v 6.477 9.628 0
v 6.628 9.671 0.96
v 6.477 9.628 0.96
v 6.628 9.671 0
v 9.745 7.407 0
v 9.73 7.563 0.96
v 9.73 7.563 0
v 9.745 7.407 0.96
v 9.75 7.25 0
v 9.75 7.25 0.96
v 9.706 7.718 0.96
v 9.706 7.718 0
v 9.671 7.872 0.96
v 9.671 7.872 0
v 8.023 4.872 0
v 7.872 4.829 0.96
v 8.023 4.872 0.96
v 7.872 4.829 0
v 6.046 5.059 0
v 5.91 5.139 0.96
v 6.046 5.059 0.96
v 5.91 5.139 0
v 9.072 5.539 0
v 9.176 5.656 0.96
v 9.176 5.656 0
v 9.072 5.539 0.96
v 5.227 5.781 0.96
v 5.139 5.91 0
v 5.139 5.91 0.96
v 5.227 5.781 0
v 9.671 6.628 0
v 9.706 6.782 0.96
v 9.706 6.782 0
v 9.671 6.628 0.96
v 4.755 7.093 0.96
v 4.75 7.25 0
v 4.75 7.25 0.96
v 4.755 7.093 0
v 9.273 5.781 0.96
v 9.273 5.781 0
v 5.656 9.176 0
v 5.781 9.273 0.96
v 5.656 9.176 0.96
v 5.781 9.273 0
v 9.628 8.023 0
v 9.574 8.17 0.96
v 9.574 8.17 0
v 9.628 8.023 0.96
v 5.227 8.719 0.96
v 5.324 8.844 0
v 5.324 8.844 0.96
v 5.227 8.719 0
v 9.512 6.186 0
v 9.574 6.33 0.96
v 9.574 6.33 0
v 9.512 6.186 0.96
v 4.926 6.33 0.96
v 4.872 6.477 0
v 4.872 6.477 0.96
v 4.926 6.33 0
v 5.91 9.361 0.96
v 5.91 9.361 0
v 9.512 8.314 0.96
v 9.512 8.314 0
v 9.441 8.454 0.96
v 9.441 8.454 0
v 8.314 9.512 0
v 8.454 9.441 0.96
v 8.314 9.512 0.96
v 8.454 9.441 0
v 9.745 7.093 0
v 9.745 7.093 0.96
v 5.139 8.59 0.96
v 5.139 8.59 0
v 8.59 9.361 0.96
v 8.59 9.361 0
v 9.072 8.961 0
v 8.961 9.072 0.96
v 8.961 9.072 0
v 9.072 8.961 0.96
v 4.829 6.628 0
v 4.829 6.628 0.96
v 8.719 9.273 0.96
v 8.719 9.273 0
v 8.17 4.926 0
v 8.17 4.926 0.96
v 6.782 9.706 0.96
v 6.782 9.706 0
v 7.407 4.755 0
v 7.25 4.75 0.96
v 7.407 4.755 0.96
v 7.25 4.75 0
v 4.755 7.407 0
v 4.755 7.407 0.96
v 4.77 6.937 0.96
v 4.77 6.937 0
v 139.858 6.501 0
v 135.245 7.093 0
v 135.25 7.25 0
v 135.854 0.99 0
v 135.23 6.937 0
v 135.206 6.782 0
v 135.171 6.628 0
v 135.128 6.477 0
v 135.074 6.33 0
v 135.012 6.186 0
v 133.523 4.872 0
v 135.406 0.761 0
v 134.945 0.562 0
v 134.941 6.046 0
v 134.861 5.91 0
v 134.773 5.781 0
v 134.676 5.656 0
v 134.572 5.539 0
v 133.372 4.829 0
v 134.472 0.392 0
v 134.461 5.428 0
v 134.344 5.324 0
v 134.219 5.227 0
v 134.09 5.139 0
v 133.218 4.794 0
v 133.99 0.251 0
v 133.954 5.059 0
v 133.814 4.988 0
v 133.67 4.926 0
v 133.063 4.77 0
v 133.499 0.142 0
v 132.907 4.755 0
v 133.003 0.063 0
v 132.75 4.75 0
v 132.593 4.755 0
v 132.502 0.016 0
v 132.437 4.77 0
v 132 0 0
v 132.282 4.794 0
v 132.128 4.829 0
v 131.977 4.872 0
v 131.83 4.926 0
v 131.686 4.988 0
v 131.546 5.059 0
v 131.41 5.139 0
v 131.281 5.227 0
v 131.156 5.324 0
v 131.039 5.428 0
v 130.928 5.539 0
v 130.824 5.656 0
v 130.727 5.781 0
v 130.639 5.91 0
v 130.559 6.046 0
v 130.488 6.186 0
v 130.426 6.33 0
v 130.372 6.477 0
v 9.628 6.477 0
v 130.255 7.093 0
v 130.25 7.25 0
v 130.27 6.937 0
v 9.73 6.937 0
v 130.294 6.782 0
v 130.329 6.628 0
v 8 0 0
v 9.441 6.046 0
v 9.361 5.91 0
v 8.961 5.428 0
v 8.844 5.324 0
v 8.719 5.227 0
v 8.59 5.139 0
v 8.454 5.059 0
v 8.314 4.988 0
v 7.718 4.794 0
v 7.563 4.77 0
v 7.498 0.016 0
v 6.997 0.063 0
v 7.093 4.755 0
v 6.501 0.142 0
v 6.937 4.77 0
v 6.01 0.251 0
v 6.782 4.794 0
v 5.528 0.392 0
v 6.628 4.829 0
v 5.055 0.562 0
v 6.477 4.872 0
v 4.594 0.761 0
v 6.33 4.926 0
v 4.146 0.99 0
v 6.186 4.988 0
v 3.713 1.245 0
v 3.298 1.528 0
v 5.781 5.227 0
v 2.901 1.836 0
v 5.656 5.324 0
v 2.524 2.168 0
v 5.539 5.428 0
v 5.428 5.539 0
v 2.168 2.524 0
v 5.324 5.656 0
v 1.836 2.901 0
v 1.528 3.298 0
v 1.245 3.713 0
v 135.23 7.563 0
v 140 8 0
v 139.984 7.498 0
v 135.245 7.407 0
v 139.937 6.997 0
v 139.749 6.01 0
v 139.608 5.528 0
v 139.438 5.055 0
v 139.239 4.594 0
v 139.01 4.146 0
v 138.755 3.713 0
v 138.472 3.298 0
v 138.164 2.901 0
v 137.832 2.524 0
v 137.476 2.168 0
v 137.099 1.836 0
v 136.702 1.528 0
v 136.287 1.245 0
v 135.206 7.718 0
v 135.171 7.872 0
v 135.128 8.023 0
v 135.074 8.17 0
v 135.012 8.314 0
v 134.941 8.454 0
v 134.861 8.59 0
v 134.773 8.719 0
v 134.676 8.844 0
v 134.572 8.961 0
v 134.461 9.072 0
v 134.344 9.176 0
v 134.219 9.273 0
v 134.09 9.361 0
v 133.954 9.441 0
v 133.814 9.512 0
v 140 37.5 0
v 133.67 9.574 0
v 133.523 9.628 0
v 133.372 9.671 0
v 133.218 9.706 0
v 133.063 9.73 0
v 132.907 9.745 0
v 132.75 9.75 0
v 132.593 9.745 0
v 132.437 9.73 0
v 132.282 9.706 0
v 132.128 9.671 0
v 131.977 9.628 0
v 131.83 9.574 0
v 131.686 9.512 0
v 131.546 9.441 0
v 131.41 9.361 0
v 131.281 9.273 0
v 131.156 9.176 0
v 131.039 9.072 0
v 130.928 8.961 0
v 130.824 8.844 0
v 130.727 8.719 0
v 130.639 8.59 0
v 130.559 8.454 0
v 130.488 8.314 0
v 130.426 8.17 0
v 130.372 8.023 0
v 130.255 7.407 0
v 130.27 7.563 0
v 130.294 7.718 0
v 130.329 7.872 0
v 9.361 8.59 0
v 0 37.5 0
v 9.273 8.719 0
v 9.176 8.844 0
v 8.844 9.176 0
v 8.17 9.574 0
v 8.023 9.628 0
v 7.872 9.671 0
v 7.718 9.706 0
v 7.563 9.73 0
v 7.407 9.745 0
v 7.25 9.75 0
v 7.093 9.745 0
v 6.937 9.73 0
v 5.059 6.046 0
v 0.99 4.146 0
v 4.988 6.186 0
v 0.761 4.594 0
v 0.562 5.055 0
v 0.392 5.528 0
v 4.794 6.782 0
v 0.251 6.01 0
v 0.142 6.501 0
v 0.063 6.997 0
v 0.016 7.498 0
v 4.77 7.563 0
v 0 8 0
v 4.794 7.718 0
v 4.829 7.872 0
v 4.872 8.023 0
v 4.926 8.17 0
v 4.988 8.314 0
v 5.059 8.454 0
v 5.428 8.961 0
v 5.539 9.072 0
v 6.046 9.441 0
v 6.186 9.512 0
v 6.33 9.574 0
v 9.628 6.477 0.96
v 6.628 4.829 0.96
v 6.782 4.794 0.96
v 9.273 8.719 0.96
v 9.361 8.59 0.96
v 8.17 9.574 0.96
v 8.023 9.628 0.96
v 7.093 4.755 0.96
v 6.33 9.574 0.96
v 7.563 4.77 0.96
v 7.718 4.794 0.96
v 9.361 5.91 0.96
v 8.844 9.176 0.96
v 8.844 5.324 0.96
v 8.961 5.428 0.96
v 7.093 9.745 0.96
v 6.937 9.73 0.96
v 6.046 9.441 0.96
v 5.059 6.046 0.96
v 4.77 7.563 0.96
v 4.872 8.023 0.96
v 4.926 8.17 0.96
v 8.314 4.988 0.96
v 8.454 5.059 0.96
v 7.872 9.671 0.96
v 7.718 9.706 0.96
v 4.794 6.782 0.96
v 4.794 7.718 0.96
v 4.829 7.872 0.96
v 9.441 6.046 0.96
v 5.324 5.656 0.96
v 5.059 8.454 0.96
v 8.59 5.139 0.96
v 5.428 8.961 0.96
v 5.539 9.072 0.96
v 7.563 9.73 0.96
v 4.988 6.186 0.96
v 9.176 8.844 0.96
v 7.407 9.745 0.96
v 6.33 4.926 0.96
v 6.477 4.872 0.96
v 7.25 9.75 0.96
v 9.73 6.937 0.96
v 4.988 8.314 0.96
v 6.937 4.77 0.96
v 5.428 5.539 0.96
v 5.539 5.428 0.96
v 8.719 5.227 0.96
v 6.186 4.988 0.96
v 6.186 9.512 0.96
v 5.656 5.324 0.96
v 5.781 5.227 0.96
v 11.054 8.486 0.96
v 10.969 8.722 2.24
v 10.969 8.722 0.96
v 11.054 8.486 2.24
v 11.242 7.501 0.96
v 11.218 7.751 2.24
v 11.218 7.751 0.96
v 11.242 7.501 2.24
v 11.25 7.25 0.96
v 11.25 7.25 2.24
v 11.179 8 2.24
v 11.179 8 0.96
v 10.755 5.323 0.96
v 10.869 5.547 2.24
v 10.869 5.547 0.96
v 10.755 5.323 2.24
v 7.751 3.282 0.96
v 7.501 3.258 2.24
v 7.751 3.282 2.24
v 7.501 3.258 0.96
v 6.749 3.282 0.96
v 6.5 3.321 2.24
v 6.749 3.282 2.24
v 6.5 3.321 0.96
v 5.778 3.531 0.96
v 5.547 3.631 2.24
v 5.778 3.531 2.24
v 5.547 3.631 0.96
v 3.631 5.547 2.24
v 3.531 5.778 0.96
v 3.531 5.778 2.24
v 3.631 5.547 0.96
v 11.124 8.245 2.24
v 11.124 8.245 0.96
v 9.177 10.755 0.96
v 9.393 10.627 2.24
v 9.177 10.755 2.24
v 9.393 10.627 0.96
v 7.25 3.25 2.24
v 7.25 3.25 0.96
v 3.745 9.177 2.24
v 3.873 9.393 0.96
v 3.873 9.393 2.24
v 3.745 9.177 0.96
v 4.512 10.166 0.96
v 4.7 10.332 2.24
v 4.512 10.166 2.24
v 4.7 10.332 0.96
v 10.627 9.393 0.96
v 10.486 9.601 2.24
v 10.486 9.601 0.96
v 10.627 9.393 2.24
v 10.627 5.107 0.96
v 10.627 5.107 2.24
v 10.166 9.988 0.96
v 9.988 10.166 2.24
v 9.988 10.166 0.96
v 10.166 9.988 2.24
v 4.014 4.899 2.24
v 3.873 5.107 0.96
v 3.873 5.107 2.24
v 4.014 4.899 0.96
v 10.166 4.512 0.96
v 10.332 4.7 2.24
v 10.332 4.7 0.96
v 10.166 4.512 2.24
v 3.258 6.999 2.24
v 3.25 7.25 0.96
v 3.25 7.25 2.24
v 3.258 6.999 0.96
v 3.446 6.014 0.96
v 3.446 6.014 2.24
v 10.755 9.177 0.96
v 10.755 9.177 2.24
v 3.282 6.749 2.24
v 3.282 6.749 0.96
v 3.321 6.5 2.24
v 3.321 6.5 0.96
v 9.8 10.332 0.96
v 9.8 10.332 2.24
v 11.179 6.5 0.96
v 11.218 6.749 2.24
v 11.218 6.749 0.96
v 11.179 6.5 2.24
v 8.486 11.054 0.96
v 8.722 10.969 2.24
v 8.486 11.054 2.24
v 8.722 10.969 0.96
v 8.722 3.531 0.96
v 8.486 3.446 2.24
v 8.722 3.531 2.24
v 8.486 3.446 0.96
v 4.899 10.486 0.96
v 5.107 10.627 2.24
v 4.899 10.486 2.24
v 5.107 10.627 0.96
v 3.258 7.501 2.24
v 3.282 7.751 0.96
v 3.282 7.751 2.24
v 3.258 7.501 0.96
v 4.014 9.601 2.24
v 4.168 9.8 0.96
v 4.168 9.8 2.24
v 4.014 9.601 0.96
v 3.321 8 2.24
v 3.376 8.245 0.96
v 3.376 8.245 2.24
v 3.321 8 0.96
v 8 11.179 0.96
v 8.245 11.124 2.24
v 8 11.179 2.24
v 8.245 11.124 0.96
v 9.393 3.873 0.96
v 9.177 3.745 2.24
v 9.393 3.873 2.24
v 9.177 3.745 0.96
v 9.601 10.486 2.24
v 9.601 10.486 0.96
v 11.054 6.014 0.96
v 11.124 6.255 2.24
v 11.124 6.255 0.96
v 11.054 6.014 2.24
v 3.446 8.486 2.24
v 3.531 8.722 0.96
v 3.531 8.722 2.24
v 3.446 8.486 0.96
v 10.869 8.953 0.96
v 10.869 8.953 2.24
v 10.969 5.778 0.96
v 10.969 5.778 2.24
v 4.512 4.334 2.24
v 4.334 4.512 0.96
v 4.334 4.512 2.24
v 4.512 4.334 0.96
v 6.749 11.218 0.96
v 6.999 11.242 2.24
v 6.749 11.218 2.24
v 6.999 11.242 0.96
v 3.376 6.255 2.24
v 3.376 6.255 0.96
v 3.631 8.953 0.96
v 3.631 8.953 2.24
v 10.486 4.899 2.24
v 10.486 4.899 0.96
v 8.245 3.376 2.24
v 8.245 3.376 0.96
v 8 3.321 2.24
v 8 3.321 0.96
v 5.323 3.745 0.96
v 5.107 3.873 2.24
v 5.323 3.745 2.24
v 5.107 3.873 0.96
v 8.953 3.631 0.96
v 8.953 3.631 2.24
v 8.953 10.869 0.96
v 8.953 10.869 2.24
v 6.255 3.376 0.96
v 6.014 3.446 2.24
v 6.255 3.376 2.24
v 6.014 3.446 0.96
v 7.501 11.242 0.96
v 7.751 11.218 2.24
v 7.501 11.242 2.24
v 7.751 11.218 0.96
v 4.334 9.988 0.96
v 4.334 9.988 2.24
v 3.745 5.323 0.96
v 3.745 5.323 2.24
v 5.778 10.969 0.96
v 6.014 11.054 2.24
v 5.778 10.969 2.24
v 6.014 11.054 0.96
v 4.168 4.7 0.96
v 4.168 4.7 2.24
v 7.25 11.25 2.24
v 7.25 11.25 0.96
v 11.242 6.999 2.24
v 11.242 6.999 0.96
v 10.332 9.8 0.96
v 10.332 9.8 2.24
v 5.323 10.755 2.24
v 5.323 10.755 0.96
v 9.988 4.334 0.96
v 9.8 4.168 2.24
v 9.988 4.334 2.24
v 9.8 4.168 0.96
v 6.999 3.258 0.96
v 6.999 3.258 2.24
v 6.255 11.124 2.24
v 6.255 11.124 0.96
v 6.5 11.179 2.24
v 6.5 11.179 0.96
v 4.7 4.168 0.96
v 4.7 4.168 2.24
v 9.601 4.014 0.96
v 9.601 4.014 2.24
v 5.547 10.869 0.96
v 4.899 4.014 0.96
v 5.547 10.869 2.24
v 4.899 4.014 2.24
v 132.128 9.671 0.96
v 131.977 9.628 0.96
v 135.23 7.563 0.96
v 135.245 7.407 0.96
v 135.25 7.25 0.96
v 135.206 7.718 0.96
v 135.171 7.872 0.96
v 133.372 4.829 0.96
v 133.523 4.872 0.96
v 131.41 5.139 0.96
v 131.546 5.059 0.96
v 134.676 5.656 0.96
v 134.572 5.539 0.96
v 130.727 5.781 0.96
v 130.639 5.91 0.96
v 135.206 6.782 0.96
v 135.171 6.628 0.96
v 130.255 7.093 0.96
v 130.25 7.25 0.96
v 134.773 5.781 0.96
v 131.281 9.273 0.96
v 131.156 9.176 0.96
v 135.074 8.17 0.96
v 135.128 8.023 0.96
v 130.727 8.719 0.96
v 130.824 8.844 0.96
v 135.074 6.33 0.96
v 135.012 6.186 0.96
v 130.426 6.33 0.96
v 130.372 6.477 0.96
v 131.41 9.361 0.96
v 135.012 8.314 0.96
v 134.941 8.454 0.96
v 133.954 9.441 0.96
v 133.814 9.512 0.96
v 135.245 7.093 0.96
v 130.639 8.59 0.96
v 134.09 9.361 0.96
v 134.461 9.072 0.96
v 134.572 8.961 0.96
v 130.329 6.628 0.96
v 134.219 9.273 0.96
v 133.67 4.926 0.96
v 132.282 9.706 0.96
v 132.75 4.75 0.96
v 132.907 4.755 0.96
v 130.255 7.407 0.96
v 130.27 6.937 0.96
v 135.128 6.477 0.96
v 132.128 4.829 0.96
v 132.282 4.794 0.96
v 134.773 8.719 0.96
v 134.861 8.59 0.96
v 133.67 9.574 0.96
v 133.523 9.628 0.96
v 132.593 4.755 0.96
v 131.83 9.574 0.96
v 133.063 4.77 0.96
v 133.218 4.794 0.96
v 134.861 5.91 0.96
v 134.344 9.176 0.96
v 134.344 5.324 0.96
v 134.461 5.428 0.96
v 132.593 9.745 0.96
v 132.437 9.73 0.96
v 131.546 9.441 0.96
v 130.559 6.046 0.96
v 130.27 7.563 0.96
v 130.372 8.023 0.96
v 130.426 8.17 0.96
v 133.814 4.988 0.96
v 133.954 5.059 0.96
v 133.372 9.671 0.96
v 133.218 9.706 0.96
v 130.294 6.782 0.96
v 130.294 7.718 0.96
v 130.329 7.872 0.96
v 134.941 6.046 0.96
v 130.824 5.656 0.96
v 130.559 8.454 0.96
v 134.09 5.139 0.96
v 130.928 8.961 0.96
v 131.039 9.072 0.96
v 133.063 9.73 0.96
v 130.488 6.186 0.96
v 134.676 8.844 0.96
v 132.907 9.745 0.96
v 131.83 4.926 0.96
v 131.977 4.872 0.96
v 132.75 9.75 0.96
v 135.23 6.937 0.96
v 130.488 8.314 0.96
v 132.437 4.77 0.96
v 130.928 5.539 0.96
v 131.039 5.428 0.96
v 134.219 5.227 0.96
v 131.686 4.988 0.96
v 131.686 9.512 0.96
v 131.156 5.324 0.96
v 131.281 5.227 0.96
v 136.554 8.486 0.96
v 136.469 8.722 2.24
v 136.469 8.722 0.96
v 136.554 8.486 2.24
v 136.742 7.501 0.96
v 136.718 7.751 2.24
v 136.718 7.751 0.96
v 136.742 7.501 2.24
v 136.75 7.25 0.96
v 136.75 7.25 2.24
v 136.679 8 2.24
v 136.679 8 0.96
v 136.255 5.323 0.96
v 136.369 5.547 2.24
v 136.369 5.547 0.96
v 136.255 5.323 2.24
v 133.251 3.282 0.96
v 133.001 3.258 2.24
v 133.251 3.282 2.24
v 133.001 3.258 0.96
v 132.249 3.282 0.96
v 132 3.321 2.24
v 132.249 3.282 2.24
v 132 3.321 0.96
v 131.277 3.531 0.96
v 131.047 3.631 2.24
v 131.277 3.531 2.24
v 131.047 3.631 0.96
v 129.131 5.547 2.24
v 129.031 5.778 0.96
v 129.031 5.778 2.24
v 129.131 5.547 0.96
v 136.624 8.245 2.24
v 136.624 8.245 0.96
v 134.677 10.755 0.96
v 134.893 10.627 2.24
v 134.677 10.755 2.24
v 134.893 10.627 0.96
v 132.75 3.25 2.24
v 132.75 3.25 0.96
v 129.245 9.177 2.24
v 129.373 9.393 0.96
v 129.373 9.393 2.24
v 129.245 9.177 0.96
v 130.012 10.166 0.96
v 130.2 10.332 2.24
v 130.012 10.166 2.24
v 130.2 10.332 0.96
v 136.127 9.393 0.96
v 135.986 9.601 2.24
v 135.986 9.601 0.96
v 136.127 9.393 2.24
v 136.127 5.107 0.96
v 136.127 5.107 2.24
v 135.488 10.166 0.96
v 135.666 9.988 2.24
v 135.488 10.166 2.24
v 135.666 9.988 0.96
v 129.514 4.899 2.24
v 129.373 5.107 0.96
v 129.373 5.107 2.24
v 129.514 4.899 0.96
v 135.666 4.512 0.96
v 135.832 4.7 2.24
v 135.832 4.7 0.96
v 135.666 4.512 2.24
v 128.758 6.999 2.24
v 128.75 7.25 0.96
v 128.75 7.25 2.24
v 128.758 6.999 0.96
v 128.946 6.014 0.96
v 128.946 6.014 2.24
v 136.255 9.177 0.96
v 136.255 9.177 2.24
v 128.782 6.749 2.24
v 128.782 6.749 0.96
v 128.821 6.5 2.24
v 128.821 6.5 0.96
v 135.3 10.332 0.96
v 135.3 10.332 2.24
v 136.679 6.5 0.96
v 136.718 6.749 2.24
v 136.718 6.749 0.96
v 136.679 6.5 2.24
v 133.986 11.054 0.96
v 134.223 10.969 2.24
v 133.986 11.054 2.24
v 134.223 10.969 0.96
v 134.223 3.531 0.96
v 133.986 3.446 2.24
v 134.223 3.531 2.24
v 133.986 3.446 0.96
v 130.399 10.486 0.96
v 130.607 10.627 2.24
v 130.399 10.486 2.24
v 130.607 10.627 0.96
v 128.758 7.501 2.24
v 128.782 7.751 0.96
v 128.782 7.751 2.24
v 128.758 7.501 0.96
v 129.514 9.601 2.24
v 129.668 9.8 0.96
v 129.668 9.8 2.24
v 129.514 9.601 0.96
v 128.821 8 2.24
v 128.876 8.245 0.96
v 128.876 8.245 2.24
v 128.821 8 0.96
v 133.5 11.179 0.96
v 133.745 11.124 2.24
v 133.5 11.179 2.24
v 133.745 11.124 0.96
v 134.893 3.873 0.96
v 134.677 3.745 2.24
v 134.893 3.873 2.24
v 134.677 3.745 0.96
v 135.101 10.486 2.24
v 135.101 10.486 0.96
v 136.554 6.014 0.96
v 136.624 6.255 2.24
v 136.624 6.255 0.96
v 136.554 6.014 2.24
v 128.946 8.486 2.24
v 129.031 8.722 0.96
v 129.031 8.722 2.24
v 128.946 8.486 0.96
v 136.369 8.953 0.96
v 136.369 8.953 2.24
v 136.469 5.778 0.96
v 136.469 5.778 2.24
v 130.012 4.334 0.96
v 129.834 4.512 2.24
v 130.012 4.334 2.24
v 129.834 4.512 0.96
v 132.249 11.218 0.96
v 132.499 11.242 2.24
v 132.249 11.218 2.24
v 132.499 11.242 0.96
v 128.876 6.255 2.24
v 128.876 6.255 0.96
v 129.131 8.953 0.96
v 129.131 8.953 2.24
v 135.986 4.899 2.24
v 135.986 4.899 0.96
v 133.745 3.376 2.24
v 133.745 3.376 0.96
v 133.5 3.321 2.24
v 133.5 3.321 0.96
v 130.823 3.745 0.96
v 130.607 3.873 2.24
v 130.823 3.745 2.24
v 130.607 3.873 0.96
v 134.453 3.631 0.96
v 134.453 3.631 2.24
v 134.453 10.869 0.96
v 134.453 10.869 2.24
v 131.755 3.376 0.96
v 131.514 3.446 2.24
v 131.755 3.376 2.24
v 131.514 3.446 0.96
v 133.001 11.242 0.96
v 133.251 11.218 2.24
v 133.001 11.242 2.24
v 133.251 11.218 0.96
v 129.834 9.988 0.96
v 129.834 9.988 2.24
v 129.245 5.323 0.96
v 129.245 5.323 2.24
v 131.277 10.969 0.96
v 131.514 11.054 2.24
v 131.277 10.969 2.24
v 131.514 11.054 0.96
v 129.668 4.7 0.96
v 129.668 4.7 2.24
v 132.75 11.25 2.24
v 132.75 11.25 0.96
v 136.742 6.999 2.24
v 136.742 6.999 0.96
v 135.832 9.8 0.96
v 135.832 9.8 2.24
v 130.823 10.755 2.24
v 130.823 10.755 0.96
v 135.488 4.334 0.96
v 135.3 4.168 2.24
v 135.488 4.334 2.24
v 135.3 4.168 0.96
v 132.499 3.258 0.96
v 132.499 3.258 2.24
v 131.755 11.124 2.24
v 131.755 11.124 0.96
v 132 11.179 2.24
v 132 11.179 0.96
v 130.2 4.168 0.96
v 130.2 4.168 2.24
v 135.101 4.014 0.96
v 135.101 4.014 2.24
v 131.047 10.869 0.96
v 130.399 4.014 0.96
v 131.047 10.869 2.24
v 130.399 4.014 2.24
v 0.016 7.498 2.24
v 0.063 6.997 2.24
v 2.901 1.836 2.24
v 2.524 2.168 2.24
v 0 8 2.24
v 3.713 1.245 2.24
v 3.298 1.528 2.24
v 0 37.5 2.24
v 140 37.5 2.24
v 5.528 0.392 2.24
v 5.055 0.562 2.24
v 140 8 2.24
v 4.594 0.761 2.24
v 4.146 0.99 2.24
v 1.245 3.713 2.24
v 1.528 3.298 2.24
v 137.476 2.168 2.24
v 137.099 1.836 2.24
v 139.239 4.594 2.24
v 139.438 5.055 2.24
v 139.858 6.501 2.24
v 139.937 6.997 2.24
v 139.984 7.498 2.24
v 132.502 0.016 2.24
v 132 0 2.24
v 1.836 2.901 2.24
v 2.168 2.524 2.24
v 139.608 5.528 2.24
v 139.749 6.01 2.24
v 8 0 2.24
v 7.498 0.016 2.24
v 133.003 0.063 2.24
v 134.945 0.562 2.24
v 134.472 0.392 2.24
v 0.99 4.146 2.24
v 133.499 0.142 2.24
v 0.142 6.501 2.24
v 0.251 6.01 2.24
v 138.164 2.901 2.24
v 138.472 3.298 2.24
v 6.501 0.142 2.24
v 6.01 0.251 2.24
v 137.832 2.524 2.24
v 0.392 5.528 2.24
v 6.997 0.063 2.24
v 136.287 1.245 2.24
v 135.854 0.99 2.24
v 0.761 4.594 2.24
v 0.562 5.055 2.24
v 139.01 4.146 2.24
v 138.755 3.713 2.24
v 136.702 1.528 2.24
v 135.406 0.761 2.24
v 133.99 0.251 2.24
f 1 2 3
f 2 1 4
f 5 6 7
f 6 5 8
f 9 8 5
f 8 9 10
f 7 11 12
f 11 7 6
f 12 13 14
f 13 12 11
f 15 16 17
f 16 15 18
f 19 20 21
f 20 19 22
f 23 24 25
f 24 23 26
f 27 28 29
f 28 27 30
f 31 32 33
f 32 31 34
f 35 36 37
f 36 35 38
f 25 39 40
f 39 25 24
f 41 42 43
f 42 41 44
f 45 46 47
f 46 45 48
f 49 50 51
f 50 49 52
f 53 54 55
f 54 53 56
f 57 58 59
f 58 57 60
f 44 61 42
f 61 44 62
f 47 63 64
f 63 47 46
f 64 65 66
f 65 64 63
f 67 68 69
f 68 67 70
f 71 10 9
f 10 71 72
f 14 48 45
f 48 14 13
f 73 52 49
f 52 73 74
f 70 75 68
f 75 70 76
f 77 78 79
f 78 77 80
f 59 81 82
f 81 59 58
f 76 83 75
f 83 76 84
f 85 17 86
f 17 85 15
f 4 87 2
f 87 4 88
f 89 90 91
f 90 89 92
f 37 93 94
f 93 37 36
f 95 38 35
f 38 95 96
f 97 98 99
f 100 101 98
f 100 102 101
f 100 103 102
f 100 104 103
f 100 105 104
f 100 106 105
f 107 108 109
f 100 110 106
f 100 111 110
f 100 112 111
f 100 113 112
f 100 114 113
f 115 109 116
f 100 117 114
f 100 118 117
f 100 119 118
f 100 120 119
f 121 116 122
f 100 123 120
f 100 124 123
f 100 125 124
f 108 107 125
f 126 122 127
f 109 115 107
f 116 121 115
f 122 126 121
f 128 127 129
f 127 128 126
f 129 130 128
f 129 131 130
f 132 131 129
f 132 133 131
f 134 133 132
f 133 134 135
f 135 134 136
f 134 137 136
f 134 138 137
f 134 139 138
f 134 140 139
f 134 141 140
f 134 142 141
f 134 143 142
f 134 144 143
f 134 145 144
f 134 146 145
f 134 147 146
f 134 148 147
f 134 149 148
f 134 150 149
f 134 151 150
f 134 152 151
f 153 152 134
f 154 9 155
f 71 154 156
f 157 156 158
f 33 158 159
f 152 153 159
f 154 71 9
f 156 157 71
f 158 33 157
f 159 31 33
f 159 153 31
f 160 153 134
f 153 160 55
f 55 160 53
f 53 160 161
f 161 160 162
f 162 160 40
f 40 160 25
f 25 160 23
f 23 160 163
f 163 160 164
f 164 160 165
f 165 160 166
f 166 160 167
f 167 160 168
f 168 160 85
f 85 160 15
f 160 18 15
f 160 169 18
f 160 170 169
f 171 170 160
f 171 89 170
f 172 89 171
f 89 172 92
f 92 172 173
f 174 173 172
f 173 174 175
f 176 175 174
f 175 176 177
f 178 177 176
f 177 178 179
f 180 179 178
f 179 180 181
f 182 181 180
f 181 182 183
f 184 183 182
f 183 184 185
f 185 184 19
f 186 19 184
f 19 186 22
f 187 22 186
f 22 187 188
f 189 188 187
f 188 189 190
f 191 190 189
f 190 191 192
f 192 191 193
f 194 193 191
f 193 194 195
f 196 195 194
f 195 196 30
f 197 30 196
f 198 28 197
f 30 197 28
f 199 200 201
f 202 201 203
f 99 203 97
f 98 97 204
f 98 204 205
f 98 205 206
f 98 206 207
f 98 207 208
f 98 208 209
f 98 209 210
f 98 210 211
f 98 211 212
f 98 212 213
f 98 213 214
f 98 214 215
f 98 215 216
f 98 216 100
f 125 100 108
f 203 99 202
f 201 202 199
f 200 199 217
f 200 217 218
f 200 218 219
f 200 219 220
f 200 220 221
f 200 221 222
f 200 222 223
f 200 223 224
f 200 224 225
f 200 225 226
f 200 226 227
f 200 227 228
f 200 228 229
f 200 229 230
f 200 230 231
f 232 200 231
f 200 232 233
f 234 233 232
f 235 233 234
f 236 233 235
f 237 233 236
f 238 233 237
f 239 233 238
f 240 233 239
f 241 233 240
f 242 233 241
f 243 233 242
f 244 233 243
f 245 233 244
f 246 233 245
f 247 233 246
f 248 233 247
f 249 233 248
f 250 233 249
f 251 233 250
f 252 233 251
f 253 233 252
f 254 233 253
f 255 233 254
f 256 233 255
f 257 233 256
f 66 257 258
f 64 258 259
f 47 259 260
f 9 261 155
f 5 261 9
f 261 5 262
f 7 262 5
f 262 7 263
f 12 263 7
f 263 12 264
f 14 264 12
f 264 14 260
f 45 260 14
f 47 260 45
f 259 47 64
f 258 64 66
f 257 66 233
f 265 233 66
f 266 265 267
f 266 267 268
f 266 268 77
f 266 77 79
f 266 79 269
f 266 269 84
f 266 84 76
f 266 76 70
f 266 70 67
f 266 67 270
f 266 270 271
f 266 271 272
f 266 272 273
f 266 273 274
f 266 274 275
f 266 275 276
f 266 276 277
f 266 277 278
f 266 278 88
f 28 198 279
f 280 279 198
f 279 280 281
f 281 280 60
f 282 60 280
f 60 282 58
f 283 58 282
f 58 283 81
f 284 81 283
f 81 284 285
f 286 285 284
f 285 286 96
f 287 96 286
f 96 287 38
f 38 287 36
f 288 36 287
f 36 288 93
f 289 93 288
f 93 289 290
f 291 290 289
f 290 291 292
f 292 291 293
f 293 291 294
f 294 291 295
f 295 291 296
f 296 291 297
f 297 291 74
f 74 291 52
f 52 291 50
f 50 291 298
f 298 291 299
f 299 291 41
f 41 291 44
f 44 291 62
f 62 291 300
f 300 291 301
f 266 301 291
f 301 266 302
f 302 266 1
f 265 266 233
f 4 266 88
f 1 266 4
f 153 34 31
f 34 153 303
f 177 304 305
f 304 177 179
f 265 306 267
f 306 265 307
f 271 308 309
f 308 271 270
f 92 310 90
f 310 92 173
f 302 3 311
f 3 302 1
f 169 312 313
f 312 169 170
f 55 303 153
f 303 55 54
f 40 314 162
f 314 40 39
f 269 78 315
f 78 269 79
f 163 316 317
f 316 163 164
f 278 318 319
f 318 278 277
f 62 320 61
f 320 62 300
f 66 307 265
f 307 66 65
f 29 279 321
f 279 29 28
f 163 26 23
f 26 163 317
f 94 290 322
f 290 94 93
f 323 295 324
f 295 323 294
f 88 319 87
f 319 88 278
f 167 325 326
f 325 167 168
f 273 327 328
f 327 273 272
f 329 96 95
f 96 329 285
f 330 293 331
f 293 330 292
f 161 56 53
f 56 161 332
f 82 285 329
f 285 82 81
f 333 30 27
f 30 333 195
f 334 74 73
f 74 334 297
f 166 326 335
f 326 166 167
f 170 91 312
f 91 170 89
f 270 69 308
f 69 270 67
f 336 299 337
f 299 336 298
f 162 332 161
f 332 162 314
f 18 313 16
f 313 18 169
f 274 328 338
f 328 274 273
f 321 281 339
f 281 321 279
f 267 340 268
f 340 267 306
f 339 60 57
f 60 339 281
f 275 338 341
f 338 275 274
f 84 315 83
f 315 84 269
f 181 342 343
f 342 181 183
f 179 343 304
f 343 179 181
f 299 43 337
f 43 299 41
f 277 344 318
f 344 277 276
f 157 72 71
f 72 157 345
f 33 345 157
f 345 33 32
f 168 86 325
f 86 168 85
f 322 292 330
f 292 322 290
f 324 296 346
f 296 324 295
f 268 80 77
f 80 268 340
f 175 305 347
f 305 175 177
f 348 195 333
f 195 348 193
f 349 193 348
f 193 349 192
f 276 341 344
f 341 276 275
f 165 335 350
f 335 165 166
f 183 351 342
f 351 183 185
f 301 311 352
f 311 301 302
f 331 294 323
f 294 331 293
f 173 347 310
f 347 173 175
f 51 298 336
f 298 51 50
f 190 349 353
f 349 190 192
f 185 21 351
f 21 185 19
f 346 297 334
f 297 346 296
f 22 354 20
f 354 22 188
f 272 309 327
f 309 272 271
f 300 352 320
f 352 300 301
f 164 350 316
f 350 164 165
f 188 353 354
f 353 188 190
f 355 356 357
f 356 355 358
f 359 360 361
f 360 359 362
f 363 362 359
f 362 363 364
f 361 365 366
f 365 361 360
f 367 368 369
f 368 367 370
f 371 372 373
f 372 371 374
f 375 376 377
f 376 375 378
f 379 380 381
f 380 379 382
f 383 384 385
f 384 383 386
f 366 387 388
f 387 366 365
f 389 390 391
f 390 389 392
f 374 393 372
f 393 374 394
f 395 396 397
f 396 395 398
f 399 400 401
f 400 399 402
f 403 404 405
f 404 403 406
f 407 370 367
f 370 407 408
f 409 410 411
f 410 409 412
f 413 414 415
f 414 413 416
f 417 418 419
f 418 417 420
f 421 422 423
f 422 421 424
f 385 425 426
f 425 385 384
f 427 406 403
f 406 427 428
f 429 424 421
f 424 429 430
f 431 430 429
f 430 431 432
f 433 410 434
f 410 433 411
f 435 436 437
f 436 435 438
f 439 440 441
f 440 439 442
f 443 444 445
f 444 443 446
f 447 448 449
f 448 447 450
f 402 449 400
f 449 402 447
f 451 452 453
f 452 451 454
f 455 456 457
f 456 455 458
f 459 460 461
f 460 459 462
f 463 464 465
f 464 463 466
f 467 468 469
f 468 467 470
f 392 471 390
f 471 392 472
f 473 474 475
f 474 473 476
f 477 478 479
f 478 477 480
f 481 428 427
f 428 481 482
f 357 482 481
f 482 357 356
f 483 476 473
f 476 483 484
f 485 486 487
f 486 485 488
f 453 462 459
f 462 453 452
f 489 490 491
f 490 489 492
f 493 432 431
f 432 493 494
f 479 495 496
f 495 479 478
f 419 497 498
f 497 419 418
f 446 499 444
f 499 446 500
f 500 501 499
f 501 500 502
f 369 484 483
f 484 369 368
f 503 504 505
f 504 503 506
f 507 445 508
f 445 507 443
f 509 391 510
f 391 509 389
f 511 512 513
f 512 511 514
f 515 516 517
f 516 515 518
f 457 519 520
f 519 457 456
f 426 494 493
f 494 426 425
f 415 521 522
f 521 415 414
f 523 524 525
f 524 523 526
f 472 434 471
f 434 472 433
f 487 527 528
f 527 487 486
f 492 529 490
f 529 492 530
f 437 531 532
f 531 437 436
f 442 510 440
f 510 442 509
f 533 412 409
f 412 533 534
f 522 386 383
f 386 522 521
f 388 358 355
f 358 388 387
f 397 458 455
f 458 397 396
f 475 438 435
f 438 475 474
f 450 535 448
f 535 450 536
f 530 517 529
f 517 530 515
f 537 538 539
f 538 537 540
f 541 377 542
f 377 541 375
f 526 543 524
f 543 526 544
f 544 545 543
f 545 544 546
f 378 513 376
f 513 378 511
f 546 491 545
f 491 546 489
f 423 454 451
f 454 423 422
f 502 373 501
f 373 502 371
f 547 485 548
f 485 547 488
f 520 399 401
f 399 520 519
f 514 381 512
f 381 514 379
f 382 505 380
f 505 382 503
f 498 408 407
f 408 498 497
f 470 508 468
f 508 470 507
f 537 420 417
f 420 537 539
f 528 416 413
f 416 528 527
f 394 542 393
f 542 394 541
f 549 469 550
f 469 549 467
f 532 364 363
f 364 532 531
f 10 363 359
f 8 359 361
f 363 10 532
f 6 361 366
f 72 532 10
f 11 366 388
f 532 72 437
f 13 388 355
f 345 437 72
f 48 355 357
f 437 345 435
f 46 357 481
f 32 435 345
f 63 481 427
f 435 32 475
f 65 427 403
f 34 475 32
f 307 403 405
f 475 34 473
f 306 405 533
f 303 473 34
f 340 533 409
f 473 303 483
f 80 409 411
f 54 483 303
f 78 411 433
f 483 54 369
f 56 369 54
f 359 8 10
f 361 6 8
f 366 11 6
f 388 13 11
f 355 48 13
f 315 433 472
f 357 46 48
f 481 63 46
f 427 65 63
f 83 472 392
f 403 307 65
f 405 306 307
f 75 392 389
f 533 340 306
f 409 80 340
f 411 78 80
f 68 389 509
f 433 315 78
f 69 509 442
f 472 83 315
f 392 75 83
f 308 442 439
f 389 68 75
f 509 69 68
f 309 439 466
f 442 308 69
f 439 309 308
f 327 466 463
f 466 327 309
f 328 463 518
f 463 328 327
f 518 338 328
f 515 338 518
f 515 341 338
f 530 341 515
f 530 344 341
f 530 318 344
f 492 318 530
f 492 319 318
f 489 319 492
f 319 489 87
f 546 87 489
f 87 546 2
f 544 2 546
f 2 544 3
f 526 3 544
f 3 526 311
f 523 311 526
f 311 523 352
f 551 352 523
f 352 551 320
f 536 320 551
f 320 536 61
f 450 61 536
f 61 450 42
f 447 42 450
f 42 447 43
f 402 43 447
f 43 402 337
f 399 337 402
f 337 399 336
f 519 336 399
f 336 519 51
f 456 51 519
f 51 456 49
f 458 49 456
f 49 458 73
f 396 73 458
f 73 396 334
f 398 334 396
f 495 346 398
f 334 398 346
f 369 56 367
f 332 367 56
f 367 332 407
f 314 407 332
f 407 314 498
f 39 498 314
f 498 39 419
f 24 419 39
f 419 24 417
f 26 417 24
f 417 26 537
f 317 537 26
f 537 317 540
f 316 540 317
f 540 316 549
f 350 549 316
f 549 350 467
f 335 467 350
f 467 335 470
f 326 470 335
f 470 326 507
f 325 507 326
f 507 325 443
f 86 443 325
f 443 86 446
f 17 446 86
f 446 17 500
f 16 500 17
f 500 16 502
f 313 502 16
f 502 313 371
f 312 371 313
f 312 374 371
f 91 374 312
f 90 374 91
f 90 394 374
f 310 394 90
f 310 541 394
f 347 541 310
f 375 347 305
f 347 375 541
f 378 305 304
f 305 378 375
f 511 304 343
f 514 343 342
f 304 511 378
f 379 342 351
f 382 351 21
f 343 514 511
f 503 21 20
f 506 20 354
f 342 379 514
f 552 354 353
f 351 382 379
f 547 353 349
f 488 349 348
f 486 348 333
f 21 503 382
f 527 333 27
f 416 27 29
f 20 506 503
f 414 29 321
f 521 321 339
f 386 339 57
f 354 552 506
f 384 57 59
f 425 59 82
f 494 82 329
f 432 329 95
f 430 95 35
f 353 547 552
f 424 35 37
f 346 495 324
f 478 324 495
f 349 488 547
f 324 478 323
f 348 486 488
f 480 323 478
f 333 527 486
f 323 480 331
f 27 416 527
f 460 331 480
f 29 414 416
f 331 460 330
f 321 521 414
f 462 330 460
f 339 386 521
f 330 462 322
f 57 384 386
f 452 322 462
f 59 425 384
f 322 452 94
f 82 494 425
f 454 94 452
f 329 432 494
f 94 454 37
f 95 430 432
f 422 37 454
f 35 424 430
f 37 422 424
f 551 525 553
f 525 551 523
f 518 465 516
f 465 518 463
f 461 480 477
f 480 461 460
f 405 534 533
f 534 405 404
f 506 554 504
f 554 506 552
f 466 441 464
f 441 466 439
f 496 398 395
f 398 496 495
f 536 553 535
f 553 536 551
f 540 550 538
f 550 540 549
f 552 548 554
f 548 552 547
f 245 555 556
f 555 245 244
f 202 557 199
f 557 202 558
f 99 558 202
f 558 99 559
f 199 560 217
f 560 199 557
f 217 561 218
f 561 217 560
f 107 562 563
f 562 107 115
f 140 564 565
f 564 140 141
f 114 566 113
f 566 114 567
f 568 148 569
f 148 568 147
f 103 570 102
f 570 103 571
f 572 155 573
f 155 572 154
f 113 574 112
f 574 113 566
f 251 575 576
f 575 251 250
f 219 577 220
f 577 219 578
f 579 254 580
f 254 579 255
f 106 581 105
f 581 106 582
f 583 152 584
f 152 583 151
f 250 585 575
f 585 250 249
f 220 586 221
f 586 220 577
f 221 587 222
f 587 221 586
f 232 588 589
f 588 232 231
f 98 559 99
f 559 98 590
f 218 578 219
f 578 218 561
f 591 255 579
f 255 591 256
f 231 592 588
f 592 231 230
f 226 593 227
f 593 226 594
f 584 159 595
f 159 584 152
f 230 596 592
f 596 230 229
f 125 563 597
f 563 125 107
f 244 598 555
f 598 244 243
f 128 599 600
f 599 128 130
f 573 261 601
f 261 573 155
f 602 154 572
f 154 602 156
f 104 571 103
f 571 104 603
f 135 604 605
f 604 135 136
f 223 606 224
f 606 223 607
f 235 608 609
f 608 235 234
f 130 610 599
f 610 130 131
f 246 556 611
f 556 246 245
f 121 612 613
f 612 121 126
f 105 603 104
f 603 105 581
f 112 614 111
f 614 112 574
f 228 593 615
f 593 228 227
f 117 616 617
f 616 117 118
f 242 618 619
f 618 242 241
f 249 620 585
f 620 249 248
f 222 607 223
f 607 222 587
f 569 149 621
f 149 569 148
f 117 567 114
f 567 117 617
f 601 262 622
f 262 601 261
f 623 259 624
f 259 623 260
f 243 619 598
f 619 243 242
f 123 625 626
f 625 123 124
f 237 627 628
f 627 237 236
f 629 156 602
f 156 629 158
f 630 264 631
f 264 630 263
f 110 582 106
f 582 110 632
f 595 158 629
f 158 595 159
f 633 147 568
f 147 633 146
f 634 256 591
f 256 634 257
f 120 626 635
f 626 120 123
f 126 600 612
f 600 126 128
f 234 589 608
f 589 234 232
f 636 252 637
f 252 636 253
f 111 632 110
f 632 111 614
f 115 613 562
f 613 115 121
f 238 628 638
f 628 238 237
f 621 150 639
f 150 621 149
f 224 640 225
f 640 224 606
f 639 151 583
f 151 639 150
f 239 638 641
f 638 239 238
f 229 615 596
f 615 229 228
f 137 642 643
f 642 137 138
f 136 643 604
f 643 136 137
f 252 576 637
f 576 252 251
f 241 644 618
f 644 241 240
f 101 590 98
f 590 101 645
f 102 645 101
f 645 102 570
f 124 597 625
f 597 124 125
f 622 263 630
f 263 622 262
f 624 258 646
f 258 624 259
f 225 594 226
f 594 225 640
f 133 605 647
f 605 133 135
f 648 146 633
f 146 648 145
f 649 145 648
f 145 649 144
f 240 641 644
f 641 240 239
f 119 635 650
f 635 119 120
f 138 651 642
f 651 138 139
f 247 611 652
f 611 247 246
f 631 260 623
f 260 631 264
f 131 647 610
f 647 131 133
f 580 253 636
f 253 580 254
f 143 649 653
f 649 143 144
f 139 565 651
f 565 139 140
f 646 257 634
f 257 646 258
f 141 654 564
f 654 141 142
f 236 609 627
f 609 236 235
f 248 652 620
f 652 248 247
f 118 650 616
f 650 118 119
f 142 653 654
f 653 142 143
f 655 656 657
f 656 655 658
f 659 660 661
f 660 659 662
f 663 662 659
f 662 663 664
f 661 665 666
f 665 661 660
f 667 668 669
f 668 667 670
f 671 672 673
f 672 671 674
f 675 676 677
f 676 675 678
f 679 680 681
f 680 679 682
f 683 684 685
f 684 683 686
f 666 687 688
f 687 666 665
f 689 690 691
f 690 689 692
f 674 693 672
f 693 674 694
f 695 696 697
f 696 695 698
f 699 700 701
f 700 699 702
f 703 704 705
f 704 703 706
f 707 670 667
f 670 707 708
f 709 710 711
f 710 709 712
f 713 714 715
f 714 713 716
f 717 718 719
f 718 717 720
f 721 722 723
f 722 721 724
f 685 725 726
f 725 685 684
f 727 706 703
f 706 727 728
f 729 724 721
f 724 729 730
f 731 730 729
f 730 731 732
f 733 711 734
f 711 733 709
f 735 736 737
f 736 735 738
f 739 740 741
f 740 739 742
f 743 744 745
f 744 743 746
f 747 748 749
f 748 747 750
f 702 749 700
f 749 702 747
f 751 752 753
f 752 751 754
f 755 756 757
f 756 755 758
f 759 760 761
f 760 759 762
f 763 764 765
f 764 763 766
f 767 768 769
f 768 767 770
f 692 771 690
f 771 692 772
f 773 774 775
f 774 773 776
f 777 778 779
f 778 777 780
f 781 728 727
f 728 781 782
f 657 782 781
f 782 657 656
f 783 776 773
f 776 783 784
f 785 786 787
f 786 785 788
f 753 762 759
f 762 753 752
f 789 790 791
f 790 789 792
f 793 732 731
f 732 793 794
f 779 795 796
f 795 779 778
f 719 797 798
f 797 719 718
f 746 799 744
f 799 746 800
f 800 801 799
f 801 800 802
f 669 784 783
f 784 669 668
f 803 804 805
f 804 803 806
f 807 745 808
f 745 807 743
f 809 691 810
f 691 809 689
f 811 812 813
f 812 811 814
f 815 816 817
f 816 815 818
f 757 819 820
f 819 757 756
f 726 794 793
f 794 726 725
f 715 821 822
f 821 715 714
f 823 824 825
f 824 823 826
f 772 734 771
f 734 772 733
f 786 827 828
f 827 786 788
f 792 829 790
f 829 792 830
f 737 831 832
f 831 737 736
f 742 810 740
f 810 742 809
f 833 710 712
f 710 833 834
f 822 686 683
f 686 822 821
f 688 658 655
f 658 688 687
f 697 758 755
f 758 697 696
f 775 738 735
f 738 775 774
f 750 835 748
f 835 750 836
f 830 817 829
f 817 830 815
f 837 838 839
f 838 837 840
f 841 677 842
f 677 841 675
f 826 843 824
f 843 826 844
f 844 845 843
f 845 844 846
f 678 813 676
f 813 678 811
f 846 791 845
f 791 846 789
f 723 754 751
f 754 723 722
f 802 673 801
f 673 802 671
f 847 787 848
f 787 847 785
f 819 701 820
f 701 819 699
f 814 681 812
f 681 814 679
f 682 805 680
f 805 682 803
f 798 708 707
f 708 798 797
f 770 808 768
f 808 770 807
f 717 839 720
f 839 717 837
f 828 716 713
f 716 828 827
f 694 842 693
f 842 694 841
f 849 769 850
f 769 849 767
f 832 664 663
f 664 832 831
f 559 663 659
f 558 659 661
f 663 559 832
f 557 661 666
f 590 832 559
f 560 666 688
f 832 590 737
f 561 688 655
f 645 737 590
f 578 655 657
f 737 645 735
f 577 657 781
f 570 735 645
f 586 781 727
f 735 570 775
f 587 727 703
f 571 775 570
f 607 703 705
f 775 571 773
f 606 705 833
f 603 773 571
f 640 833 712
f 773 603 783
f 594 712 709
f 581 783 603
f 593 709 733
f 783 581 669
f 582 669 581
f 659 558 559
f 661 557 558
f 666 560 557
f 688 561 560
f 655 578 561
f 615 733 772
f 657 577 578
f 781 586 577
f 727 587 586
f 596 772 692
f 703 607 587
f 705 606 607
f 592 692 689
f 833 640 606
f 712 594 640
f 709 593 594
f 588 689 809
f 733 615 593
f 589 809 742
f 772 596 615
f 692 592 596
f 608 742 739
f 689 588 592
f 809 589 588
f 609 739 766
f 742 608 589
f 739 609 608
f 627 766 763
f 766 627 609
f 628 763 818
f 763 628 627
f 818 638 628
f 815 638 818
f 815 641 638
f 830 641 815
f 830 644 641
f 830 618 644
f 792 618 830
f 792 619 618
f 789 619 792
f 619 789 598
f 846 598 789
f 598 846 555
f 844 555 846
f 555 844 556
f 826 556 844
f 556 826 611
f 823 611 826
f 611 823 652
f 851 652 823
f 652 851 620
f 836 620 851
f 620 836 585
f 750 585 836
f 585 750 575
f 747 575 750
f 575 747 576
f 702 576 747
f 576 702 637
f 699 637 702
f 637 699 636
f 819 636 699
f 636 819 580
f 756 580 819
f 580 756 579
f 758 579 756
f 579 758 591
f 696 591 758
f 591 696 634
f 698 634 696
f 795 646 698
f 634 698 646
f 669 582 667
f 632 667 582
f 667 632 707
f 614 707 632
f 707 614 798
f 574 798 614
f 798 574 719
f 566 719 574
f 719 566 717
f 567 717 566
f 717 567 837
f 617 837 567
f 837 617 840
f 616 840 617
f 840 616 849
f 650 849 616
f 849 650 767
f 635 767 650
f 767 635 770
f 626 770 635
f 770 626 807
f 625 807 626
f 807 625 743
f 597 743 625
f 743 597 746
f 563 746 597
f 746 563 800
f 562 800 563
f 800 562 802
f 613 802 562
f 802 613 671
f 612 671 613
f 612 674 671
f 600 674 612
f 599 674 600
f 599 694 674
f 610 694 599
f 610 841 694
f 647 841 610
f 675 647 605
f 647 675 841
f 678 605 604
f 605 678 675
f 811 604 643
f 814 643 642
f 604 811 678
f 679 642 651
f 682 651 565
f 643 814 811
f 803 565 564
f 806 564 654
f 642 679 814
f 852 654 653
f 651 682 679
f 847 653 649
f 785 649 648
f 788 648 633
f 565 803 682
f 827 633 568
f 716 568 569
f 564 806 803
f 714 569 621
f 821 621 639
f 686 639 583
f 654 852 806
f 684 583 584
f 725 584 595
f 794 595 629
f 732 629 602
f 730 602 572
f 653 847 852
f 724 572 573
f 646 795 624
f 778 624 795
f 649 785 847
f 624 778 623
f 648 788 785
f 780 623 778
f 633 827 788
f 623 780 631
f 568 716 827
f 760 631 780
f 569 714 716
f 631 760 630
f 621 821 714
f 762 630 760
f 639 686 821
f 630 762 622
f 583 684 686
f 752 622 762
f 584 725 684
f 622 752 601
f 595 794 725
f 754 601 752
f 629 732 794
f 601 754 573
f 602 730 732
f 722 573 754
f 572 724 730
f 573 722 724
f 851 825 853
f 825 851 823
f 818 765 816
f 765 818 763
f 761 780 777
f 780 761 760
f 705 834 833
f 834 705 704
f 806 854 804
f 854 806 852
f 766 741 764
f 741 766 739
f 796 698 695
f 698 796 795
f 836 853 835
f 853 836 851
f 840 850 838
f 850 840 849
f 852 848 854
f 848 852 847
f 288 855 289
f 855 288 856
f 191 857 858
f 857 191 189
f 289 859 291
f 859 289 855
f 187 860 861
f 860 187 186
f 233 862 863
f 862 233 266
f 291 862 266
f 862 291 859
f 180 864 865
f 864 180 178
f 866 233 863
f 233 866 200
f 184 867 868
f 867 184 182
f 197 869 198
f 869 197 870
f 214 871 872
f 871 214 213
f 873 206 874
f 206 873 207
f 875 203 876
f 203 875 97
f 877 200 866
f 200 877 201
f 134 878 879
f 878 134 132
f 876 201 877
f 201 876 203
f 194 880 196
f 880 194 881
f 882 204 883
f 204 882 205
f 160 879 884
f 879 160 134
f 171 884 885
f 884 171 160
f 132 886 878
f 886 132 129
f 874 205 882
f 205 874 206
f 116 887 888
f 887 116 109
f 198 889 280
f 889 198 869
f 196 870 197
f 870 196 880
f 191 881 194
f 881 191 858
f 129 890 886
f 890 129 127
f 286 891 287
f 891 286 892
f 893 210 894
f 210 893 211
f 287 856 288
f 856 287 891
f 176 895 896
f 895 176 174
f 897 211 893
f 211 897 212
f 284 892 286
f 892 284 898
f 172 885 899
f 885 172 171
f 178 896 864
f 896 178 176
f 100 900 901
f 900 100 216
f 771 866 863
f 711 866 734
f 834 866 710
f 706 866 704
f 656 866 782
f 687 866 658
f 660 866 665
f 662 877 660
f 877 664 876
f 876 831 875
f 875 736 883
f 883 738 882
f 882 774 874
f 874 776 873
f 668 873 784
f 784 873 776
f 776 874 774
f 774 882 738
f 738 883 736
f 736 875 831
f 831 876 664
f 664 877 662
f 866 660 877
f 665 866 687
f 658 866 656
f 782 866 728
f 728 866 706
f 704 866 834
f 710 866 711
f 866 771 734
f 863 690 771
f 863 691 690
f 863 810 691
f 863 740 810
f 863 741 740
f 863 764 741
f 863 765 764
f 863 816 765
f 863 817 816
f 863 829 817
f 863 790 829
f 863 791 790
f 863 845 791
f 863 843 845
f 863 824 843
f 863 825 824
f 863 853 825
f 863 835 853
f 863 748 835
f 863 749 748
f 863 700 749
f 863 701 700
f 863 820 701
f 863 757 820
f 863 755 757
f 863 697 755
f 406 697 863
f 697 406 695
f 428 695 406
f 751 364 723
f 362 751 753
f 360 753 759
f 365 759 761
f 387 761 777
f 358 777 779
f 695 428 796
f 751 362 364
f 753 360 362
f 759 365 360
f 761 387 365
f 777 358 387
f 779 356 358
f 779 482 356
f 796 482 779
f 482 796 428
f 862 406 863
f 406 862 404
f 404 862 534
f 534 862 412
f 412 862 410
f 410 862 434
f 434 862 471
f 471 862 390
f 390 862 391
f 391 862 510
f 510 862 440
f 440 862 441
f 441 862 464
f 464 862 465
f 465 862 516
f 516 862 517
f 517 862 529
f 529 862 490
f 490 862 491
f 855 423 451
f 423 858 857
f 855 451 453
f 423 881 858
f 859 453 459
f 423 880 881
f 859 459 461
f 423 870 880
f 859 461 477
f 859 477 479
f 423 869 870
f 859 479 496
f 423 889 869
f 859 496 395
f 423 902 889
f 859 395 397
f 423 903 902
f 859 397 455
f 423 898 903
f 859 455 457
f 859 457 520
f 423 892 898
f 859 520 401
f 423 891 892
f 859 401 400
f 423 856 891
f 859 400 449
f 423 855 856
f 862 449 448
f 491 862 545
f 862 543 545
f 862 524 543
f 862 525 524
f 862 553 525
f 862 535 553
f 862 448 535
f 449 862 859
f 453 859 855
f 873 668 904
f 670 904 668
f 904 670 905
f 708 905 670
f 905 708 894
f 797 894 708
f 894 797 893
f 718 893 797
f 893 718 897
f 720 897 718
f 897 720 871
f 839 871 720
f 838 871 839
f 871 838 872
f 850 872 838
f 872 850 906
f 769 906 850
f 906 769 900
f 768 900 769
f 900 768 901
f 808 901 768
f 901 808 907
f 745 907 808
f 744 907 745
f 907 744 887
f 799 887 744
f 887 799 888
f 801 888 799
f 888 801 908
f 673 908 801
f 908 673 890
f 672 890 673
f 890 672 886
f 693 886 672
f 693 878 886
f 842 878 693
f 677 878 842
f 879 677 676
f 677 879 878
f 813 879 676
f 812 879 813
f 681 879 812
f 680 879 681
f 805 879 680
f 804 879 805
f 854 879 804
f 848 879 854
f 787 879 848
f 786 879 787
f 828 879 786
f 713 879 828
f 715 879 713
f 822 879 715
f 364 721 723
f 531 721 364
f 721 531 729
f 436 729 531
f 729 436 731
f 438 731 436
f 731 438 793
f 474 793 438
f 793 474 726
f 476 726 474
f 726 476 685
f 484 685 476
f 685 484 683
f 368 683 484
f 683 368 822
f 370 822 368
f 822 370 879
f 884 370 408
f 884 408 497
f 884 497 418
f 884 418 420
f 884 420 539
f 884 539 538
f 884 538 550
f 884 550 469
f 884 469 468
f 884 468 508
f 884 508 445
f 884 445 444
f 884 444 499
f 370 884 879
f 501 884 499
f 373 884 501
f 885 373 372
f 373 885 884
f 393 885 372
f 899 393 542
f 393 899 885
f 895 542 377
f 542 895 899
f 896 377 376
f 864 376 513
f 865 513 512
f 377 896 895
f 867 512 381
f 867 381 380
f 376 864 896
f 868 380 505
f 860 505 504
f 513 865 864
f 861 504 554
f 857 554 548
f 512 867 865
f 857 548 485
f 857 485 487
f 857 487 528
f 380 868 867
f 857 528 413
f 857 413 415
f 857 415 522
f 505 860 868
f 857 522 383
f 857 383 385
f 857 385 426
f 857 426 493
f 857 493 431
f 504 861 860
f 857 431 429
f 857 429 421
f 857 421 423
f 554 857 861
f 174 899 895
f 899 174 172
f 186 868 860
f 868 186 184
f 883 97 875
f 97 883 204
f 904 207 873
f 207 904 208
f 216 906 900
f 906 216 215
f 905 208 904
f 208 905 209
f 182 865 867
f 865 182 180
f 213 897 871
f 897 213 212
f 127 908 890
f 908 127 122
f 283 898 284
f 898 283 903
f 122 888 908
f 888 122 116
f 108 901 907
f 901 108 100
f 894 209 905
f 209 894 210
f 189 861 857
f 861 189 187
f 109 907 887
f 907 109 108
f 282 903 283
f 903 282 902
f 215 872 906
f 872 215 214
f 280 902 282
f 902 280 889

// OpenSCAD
//minkowski() {
//    difference() {
//        cube([138, 53, 1.5]);
//        union() {
//            translate([6.25, 6.25, 0])
//            screw_hole();
//            translate([138 - 6.25, 6.25, 0])
//            screw_hole();
//        }
//    }
//    cylinder(r=1, h=0.01, $fn=24);
//}

$fn=100;
module screw_hole(height) {
    color("black")
    cylinder(r=5/2, h=height+0.96);

    color("red")
    translate([0, 0, 0.96])
    cylinder(r=8/2, h=height);
}

l = 40-2.5;
w = 140;
//h = 32.5;
t = 2.24;


module base() {
    linear_extrude(height=t) {
        hull() {
            color("blue")
            translate([8, 8])
            circle(r=8);

            color("blue")
            translate([w-8, 8])
            circle(r=8);

            color("blue")
            translate([0,l-5])
            square([5,5]);

            color("blue")
            translate([w-5,l-5])
            square([5,5]);
        }
    }
}

difference() {
    base();
    union() {
        translate([7.25, 7.25, 0])
        screw_hole(12);
        translate([w - 7.25, 7.25, 0])
        screw_hole(12);
    }
}

// angled
//hyp = sqrt(pow(l,2) + pow(h,2));
//
//module prism() {
//    hull() {
//        cube([w, l, t]);
//
//        rotate([acos(l/hyp),0,0])
//        cube([1,hyp,t]);
//
//        rotate([acos(l/hyp),0,0])
//        translate([w-1,0,0])
//        cube([1,hyp,t]);
//    }
//}
//
//module hollowed() {
//    difference() {
//        prism();
//        translate([t,1,-1])
//        scale([0.98,1,1])
//        prism();
//    }
//}
//
//
//module shroud() {
//    difference() {
//        union() {
//            hollowed();
//            hull() {
//                intersection() {
//                    hollowed();
//                    cube([12,12,12]);
//                }
//                cube([12,12,1]);
//            }
//            hull() {
//                intersection() {
//                    hollowed();
//                    translate([w - 12, 0, 0])
//                    cube([12,12,12]);
//                }
//                translate([w - 12, 0, 0])
//                cube([12,12,1]);
//            }
//        }
//        translate([6.25, 6.25, 0])
//        screw_hole(12);
//        translate([w - 6.25, 6.25, 0])
//        screw_hole(12);
//    }
//}
//
//module left_shroud() {
//    shroud();
//    translate([0,l - 1,0])
//    cube([1.5, 9 + 1, h]);
//}
//
//
//module hergh() {
//    difference() {
//        left_shroud();
//        color("red")
//        translate([w-10, l-3, h-3])
//        cube([10-t+.3, 3, 10]);
//    }
//
//    color("red")
//    translate([w-10, l-3, h-3-1.5])
//    cube([10, 3, 1.5]);
//
//    color("red")
//    translate([w-10, l-4.5, h-3-1.5])
//    cube([10, 1.5, 3]);
//
//
//
//    hull() {
//        intersection() {
//            left_shroud();
//            color("red")
//            translate([w-10-1.5, l-4.5, h-3-1.5])
//            cube([1.5, 4.5, 5]);
//        }
//
//        color("blue")
//        translate([w-10-1.5, l-4.5, h-3-1.5])
//        cube([1.5, 4.5, 1.5]);
//    }
//}
//
//translate([-1,0,0])
//intersection() {
//    hergh();
//    color("blue")
//    translate([w-1.3, l-4.5, h-3-1.5])
//    cube([1.4, 6, 6]);
//}
//hergh();
//
//
////l = 45;
////h = 37;
//_w = w - 80;
//_ww = w - _w;
//_h = h - 16 + 4.5;
//_hh = h - _h;
//_l = l - 20 - 2.5;
//_ll = l - _l;
//_hyp = sqrt(pow(_ll, 2) + pow(_hh, 2));
//
//
//module _right_shroud() {
//    difference() {
//        union() {
//            shroud();
//            translate([w-t+.24,l - 1,0])
//            cube([t-.24, 9+1, h+1]);
//        }
//
//        translate([_ww,_l,_h])
//        cube([_w, 35, 22]);
//    }
//}
//
//
//module right_shroud() {
//    translate([_ww-1.5,_l+3,_h-1.5])
//    cube([_w+1.5,_ll-3, t]);
//
//    hull() {
//        intersection() {
//            translate([_ww-t,_l+3,_h-1.5])
//            cube([t,_l-3,_h]);
//            _right_shroud();
//        }
//        translate([_ww-t,_l+3,_h-1.5])
//        cube([t,_ll-3, t]);
//    }
//    _right_shroud();
//}
//
////left_shroud();
////translate([w,0,0])
////right_shroud();
